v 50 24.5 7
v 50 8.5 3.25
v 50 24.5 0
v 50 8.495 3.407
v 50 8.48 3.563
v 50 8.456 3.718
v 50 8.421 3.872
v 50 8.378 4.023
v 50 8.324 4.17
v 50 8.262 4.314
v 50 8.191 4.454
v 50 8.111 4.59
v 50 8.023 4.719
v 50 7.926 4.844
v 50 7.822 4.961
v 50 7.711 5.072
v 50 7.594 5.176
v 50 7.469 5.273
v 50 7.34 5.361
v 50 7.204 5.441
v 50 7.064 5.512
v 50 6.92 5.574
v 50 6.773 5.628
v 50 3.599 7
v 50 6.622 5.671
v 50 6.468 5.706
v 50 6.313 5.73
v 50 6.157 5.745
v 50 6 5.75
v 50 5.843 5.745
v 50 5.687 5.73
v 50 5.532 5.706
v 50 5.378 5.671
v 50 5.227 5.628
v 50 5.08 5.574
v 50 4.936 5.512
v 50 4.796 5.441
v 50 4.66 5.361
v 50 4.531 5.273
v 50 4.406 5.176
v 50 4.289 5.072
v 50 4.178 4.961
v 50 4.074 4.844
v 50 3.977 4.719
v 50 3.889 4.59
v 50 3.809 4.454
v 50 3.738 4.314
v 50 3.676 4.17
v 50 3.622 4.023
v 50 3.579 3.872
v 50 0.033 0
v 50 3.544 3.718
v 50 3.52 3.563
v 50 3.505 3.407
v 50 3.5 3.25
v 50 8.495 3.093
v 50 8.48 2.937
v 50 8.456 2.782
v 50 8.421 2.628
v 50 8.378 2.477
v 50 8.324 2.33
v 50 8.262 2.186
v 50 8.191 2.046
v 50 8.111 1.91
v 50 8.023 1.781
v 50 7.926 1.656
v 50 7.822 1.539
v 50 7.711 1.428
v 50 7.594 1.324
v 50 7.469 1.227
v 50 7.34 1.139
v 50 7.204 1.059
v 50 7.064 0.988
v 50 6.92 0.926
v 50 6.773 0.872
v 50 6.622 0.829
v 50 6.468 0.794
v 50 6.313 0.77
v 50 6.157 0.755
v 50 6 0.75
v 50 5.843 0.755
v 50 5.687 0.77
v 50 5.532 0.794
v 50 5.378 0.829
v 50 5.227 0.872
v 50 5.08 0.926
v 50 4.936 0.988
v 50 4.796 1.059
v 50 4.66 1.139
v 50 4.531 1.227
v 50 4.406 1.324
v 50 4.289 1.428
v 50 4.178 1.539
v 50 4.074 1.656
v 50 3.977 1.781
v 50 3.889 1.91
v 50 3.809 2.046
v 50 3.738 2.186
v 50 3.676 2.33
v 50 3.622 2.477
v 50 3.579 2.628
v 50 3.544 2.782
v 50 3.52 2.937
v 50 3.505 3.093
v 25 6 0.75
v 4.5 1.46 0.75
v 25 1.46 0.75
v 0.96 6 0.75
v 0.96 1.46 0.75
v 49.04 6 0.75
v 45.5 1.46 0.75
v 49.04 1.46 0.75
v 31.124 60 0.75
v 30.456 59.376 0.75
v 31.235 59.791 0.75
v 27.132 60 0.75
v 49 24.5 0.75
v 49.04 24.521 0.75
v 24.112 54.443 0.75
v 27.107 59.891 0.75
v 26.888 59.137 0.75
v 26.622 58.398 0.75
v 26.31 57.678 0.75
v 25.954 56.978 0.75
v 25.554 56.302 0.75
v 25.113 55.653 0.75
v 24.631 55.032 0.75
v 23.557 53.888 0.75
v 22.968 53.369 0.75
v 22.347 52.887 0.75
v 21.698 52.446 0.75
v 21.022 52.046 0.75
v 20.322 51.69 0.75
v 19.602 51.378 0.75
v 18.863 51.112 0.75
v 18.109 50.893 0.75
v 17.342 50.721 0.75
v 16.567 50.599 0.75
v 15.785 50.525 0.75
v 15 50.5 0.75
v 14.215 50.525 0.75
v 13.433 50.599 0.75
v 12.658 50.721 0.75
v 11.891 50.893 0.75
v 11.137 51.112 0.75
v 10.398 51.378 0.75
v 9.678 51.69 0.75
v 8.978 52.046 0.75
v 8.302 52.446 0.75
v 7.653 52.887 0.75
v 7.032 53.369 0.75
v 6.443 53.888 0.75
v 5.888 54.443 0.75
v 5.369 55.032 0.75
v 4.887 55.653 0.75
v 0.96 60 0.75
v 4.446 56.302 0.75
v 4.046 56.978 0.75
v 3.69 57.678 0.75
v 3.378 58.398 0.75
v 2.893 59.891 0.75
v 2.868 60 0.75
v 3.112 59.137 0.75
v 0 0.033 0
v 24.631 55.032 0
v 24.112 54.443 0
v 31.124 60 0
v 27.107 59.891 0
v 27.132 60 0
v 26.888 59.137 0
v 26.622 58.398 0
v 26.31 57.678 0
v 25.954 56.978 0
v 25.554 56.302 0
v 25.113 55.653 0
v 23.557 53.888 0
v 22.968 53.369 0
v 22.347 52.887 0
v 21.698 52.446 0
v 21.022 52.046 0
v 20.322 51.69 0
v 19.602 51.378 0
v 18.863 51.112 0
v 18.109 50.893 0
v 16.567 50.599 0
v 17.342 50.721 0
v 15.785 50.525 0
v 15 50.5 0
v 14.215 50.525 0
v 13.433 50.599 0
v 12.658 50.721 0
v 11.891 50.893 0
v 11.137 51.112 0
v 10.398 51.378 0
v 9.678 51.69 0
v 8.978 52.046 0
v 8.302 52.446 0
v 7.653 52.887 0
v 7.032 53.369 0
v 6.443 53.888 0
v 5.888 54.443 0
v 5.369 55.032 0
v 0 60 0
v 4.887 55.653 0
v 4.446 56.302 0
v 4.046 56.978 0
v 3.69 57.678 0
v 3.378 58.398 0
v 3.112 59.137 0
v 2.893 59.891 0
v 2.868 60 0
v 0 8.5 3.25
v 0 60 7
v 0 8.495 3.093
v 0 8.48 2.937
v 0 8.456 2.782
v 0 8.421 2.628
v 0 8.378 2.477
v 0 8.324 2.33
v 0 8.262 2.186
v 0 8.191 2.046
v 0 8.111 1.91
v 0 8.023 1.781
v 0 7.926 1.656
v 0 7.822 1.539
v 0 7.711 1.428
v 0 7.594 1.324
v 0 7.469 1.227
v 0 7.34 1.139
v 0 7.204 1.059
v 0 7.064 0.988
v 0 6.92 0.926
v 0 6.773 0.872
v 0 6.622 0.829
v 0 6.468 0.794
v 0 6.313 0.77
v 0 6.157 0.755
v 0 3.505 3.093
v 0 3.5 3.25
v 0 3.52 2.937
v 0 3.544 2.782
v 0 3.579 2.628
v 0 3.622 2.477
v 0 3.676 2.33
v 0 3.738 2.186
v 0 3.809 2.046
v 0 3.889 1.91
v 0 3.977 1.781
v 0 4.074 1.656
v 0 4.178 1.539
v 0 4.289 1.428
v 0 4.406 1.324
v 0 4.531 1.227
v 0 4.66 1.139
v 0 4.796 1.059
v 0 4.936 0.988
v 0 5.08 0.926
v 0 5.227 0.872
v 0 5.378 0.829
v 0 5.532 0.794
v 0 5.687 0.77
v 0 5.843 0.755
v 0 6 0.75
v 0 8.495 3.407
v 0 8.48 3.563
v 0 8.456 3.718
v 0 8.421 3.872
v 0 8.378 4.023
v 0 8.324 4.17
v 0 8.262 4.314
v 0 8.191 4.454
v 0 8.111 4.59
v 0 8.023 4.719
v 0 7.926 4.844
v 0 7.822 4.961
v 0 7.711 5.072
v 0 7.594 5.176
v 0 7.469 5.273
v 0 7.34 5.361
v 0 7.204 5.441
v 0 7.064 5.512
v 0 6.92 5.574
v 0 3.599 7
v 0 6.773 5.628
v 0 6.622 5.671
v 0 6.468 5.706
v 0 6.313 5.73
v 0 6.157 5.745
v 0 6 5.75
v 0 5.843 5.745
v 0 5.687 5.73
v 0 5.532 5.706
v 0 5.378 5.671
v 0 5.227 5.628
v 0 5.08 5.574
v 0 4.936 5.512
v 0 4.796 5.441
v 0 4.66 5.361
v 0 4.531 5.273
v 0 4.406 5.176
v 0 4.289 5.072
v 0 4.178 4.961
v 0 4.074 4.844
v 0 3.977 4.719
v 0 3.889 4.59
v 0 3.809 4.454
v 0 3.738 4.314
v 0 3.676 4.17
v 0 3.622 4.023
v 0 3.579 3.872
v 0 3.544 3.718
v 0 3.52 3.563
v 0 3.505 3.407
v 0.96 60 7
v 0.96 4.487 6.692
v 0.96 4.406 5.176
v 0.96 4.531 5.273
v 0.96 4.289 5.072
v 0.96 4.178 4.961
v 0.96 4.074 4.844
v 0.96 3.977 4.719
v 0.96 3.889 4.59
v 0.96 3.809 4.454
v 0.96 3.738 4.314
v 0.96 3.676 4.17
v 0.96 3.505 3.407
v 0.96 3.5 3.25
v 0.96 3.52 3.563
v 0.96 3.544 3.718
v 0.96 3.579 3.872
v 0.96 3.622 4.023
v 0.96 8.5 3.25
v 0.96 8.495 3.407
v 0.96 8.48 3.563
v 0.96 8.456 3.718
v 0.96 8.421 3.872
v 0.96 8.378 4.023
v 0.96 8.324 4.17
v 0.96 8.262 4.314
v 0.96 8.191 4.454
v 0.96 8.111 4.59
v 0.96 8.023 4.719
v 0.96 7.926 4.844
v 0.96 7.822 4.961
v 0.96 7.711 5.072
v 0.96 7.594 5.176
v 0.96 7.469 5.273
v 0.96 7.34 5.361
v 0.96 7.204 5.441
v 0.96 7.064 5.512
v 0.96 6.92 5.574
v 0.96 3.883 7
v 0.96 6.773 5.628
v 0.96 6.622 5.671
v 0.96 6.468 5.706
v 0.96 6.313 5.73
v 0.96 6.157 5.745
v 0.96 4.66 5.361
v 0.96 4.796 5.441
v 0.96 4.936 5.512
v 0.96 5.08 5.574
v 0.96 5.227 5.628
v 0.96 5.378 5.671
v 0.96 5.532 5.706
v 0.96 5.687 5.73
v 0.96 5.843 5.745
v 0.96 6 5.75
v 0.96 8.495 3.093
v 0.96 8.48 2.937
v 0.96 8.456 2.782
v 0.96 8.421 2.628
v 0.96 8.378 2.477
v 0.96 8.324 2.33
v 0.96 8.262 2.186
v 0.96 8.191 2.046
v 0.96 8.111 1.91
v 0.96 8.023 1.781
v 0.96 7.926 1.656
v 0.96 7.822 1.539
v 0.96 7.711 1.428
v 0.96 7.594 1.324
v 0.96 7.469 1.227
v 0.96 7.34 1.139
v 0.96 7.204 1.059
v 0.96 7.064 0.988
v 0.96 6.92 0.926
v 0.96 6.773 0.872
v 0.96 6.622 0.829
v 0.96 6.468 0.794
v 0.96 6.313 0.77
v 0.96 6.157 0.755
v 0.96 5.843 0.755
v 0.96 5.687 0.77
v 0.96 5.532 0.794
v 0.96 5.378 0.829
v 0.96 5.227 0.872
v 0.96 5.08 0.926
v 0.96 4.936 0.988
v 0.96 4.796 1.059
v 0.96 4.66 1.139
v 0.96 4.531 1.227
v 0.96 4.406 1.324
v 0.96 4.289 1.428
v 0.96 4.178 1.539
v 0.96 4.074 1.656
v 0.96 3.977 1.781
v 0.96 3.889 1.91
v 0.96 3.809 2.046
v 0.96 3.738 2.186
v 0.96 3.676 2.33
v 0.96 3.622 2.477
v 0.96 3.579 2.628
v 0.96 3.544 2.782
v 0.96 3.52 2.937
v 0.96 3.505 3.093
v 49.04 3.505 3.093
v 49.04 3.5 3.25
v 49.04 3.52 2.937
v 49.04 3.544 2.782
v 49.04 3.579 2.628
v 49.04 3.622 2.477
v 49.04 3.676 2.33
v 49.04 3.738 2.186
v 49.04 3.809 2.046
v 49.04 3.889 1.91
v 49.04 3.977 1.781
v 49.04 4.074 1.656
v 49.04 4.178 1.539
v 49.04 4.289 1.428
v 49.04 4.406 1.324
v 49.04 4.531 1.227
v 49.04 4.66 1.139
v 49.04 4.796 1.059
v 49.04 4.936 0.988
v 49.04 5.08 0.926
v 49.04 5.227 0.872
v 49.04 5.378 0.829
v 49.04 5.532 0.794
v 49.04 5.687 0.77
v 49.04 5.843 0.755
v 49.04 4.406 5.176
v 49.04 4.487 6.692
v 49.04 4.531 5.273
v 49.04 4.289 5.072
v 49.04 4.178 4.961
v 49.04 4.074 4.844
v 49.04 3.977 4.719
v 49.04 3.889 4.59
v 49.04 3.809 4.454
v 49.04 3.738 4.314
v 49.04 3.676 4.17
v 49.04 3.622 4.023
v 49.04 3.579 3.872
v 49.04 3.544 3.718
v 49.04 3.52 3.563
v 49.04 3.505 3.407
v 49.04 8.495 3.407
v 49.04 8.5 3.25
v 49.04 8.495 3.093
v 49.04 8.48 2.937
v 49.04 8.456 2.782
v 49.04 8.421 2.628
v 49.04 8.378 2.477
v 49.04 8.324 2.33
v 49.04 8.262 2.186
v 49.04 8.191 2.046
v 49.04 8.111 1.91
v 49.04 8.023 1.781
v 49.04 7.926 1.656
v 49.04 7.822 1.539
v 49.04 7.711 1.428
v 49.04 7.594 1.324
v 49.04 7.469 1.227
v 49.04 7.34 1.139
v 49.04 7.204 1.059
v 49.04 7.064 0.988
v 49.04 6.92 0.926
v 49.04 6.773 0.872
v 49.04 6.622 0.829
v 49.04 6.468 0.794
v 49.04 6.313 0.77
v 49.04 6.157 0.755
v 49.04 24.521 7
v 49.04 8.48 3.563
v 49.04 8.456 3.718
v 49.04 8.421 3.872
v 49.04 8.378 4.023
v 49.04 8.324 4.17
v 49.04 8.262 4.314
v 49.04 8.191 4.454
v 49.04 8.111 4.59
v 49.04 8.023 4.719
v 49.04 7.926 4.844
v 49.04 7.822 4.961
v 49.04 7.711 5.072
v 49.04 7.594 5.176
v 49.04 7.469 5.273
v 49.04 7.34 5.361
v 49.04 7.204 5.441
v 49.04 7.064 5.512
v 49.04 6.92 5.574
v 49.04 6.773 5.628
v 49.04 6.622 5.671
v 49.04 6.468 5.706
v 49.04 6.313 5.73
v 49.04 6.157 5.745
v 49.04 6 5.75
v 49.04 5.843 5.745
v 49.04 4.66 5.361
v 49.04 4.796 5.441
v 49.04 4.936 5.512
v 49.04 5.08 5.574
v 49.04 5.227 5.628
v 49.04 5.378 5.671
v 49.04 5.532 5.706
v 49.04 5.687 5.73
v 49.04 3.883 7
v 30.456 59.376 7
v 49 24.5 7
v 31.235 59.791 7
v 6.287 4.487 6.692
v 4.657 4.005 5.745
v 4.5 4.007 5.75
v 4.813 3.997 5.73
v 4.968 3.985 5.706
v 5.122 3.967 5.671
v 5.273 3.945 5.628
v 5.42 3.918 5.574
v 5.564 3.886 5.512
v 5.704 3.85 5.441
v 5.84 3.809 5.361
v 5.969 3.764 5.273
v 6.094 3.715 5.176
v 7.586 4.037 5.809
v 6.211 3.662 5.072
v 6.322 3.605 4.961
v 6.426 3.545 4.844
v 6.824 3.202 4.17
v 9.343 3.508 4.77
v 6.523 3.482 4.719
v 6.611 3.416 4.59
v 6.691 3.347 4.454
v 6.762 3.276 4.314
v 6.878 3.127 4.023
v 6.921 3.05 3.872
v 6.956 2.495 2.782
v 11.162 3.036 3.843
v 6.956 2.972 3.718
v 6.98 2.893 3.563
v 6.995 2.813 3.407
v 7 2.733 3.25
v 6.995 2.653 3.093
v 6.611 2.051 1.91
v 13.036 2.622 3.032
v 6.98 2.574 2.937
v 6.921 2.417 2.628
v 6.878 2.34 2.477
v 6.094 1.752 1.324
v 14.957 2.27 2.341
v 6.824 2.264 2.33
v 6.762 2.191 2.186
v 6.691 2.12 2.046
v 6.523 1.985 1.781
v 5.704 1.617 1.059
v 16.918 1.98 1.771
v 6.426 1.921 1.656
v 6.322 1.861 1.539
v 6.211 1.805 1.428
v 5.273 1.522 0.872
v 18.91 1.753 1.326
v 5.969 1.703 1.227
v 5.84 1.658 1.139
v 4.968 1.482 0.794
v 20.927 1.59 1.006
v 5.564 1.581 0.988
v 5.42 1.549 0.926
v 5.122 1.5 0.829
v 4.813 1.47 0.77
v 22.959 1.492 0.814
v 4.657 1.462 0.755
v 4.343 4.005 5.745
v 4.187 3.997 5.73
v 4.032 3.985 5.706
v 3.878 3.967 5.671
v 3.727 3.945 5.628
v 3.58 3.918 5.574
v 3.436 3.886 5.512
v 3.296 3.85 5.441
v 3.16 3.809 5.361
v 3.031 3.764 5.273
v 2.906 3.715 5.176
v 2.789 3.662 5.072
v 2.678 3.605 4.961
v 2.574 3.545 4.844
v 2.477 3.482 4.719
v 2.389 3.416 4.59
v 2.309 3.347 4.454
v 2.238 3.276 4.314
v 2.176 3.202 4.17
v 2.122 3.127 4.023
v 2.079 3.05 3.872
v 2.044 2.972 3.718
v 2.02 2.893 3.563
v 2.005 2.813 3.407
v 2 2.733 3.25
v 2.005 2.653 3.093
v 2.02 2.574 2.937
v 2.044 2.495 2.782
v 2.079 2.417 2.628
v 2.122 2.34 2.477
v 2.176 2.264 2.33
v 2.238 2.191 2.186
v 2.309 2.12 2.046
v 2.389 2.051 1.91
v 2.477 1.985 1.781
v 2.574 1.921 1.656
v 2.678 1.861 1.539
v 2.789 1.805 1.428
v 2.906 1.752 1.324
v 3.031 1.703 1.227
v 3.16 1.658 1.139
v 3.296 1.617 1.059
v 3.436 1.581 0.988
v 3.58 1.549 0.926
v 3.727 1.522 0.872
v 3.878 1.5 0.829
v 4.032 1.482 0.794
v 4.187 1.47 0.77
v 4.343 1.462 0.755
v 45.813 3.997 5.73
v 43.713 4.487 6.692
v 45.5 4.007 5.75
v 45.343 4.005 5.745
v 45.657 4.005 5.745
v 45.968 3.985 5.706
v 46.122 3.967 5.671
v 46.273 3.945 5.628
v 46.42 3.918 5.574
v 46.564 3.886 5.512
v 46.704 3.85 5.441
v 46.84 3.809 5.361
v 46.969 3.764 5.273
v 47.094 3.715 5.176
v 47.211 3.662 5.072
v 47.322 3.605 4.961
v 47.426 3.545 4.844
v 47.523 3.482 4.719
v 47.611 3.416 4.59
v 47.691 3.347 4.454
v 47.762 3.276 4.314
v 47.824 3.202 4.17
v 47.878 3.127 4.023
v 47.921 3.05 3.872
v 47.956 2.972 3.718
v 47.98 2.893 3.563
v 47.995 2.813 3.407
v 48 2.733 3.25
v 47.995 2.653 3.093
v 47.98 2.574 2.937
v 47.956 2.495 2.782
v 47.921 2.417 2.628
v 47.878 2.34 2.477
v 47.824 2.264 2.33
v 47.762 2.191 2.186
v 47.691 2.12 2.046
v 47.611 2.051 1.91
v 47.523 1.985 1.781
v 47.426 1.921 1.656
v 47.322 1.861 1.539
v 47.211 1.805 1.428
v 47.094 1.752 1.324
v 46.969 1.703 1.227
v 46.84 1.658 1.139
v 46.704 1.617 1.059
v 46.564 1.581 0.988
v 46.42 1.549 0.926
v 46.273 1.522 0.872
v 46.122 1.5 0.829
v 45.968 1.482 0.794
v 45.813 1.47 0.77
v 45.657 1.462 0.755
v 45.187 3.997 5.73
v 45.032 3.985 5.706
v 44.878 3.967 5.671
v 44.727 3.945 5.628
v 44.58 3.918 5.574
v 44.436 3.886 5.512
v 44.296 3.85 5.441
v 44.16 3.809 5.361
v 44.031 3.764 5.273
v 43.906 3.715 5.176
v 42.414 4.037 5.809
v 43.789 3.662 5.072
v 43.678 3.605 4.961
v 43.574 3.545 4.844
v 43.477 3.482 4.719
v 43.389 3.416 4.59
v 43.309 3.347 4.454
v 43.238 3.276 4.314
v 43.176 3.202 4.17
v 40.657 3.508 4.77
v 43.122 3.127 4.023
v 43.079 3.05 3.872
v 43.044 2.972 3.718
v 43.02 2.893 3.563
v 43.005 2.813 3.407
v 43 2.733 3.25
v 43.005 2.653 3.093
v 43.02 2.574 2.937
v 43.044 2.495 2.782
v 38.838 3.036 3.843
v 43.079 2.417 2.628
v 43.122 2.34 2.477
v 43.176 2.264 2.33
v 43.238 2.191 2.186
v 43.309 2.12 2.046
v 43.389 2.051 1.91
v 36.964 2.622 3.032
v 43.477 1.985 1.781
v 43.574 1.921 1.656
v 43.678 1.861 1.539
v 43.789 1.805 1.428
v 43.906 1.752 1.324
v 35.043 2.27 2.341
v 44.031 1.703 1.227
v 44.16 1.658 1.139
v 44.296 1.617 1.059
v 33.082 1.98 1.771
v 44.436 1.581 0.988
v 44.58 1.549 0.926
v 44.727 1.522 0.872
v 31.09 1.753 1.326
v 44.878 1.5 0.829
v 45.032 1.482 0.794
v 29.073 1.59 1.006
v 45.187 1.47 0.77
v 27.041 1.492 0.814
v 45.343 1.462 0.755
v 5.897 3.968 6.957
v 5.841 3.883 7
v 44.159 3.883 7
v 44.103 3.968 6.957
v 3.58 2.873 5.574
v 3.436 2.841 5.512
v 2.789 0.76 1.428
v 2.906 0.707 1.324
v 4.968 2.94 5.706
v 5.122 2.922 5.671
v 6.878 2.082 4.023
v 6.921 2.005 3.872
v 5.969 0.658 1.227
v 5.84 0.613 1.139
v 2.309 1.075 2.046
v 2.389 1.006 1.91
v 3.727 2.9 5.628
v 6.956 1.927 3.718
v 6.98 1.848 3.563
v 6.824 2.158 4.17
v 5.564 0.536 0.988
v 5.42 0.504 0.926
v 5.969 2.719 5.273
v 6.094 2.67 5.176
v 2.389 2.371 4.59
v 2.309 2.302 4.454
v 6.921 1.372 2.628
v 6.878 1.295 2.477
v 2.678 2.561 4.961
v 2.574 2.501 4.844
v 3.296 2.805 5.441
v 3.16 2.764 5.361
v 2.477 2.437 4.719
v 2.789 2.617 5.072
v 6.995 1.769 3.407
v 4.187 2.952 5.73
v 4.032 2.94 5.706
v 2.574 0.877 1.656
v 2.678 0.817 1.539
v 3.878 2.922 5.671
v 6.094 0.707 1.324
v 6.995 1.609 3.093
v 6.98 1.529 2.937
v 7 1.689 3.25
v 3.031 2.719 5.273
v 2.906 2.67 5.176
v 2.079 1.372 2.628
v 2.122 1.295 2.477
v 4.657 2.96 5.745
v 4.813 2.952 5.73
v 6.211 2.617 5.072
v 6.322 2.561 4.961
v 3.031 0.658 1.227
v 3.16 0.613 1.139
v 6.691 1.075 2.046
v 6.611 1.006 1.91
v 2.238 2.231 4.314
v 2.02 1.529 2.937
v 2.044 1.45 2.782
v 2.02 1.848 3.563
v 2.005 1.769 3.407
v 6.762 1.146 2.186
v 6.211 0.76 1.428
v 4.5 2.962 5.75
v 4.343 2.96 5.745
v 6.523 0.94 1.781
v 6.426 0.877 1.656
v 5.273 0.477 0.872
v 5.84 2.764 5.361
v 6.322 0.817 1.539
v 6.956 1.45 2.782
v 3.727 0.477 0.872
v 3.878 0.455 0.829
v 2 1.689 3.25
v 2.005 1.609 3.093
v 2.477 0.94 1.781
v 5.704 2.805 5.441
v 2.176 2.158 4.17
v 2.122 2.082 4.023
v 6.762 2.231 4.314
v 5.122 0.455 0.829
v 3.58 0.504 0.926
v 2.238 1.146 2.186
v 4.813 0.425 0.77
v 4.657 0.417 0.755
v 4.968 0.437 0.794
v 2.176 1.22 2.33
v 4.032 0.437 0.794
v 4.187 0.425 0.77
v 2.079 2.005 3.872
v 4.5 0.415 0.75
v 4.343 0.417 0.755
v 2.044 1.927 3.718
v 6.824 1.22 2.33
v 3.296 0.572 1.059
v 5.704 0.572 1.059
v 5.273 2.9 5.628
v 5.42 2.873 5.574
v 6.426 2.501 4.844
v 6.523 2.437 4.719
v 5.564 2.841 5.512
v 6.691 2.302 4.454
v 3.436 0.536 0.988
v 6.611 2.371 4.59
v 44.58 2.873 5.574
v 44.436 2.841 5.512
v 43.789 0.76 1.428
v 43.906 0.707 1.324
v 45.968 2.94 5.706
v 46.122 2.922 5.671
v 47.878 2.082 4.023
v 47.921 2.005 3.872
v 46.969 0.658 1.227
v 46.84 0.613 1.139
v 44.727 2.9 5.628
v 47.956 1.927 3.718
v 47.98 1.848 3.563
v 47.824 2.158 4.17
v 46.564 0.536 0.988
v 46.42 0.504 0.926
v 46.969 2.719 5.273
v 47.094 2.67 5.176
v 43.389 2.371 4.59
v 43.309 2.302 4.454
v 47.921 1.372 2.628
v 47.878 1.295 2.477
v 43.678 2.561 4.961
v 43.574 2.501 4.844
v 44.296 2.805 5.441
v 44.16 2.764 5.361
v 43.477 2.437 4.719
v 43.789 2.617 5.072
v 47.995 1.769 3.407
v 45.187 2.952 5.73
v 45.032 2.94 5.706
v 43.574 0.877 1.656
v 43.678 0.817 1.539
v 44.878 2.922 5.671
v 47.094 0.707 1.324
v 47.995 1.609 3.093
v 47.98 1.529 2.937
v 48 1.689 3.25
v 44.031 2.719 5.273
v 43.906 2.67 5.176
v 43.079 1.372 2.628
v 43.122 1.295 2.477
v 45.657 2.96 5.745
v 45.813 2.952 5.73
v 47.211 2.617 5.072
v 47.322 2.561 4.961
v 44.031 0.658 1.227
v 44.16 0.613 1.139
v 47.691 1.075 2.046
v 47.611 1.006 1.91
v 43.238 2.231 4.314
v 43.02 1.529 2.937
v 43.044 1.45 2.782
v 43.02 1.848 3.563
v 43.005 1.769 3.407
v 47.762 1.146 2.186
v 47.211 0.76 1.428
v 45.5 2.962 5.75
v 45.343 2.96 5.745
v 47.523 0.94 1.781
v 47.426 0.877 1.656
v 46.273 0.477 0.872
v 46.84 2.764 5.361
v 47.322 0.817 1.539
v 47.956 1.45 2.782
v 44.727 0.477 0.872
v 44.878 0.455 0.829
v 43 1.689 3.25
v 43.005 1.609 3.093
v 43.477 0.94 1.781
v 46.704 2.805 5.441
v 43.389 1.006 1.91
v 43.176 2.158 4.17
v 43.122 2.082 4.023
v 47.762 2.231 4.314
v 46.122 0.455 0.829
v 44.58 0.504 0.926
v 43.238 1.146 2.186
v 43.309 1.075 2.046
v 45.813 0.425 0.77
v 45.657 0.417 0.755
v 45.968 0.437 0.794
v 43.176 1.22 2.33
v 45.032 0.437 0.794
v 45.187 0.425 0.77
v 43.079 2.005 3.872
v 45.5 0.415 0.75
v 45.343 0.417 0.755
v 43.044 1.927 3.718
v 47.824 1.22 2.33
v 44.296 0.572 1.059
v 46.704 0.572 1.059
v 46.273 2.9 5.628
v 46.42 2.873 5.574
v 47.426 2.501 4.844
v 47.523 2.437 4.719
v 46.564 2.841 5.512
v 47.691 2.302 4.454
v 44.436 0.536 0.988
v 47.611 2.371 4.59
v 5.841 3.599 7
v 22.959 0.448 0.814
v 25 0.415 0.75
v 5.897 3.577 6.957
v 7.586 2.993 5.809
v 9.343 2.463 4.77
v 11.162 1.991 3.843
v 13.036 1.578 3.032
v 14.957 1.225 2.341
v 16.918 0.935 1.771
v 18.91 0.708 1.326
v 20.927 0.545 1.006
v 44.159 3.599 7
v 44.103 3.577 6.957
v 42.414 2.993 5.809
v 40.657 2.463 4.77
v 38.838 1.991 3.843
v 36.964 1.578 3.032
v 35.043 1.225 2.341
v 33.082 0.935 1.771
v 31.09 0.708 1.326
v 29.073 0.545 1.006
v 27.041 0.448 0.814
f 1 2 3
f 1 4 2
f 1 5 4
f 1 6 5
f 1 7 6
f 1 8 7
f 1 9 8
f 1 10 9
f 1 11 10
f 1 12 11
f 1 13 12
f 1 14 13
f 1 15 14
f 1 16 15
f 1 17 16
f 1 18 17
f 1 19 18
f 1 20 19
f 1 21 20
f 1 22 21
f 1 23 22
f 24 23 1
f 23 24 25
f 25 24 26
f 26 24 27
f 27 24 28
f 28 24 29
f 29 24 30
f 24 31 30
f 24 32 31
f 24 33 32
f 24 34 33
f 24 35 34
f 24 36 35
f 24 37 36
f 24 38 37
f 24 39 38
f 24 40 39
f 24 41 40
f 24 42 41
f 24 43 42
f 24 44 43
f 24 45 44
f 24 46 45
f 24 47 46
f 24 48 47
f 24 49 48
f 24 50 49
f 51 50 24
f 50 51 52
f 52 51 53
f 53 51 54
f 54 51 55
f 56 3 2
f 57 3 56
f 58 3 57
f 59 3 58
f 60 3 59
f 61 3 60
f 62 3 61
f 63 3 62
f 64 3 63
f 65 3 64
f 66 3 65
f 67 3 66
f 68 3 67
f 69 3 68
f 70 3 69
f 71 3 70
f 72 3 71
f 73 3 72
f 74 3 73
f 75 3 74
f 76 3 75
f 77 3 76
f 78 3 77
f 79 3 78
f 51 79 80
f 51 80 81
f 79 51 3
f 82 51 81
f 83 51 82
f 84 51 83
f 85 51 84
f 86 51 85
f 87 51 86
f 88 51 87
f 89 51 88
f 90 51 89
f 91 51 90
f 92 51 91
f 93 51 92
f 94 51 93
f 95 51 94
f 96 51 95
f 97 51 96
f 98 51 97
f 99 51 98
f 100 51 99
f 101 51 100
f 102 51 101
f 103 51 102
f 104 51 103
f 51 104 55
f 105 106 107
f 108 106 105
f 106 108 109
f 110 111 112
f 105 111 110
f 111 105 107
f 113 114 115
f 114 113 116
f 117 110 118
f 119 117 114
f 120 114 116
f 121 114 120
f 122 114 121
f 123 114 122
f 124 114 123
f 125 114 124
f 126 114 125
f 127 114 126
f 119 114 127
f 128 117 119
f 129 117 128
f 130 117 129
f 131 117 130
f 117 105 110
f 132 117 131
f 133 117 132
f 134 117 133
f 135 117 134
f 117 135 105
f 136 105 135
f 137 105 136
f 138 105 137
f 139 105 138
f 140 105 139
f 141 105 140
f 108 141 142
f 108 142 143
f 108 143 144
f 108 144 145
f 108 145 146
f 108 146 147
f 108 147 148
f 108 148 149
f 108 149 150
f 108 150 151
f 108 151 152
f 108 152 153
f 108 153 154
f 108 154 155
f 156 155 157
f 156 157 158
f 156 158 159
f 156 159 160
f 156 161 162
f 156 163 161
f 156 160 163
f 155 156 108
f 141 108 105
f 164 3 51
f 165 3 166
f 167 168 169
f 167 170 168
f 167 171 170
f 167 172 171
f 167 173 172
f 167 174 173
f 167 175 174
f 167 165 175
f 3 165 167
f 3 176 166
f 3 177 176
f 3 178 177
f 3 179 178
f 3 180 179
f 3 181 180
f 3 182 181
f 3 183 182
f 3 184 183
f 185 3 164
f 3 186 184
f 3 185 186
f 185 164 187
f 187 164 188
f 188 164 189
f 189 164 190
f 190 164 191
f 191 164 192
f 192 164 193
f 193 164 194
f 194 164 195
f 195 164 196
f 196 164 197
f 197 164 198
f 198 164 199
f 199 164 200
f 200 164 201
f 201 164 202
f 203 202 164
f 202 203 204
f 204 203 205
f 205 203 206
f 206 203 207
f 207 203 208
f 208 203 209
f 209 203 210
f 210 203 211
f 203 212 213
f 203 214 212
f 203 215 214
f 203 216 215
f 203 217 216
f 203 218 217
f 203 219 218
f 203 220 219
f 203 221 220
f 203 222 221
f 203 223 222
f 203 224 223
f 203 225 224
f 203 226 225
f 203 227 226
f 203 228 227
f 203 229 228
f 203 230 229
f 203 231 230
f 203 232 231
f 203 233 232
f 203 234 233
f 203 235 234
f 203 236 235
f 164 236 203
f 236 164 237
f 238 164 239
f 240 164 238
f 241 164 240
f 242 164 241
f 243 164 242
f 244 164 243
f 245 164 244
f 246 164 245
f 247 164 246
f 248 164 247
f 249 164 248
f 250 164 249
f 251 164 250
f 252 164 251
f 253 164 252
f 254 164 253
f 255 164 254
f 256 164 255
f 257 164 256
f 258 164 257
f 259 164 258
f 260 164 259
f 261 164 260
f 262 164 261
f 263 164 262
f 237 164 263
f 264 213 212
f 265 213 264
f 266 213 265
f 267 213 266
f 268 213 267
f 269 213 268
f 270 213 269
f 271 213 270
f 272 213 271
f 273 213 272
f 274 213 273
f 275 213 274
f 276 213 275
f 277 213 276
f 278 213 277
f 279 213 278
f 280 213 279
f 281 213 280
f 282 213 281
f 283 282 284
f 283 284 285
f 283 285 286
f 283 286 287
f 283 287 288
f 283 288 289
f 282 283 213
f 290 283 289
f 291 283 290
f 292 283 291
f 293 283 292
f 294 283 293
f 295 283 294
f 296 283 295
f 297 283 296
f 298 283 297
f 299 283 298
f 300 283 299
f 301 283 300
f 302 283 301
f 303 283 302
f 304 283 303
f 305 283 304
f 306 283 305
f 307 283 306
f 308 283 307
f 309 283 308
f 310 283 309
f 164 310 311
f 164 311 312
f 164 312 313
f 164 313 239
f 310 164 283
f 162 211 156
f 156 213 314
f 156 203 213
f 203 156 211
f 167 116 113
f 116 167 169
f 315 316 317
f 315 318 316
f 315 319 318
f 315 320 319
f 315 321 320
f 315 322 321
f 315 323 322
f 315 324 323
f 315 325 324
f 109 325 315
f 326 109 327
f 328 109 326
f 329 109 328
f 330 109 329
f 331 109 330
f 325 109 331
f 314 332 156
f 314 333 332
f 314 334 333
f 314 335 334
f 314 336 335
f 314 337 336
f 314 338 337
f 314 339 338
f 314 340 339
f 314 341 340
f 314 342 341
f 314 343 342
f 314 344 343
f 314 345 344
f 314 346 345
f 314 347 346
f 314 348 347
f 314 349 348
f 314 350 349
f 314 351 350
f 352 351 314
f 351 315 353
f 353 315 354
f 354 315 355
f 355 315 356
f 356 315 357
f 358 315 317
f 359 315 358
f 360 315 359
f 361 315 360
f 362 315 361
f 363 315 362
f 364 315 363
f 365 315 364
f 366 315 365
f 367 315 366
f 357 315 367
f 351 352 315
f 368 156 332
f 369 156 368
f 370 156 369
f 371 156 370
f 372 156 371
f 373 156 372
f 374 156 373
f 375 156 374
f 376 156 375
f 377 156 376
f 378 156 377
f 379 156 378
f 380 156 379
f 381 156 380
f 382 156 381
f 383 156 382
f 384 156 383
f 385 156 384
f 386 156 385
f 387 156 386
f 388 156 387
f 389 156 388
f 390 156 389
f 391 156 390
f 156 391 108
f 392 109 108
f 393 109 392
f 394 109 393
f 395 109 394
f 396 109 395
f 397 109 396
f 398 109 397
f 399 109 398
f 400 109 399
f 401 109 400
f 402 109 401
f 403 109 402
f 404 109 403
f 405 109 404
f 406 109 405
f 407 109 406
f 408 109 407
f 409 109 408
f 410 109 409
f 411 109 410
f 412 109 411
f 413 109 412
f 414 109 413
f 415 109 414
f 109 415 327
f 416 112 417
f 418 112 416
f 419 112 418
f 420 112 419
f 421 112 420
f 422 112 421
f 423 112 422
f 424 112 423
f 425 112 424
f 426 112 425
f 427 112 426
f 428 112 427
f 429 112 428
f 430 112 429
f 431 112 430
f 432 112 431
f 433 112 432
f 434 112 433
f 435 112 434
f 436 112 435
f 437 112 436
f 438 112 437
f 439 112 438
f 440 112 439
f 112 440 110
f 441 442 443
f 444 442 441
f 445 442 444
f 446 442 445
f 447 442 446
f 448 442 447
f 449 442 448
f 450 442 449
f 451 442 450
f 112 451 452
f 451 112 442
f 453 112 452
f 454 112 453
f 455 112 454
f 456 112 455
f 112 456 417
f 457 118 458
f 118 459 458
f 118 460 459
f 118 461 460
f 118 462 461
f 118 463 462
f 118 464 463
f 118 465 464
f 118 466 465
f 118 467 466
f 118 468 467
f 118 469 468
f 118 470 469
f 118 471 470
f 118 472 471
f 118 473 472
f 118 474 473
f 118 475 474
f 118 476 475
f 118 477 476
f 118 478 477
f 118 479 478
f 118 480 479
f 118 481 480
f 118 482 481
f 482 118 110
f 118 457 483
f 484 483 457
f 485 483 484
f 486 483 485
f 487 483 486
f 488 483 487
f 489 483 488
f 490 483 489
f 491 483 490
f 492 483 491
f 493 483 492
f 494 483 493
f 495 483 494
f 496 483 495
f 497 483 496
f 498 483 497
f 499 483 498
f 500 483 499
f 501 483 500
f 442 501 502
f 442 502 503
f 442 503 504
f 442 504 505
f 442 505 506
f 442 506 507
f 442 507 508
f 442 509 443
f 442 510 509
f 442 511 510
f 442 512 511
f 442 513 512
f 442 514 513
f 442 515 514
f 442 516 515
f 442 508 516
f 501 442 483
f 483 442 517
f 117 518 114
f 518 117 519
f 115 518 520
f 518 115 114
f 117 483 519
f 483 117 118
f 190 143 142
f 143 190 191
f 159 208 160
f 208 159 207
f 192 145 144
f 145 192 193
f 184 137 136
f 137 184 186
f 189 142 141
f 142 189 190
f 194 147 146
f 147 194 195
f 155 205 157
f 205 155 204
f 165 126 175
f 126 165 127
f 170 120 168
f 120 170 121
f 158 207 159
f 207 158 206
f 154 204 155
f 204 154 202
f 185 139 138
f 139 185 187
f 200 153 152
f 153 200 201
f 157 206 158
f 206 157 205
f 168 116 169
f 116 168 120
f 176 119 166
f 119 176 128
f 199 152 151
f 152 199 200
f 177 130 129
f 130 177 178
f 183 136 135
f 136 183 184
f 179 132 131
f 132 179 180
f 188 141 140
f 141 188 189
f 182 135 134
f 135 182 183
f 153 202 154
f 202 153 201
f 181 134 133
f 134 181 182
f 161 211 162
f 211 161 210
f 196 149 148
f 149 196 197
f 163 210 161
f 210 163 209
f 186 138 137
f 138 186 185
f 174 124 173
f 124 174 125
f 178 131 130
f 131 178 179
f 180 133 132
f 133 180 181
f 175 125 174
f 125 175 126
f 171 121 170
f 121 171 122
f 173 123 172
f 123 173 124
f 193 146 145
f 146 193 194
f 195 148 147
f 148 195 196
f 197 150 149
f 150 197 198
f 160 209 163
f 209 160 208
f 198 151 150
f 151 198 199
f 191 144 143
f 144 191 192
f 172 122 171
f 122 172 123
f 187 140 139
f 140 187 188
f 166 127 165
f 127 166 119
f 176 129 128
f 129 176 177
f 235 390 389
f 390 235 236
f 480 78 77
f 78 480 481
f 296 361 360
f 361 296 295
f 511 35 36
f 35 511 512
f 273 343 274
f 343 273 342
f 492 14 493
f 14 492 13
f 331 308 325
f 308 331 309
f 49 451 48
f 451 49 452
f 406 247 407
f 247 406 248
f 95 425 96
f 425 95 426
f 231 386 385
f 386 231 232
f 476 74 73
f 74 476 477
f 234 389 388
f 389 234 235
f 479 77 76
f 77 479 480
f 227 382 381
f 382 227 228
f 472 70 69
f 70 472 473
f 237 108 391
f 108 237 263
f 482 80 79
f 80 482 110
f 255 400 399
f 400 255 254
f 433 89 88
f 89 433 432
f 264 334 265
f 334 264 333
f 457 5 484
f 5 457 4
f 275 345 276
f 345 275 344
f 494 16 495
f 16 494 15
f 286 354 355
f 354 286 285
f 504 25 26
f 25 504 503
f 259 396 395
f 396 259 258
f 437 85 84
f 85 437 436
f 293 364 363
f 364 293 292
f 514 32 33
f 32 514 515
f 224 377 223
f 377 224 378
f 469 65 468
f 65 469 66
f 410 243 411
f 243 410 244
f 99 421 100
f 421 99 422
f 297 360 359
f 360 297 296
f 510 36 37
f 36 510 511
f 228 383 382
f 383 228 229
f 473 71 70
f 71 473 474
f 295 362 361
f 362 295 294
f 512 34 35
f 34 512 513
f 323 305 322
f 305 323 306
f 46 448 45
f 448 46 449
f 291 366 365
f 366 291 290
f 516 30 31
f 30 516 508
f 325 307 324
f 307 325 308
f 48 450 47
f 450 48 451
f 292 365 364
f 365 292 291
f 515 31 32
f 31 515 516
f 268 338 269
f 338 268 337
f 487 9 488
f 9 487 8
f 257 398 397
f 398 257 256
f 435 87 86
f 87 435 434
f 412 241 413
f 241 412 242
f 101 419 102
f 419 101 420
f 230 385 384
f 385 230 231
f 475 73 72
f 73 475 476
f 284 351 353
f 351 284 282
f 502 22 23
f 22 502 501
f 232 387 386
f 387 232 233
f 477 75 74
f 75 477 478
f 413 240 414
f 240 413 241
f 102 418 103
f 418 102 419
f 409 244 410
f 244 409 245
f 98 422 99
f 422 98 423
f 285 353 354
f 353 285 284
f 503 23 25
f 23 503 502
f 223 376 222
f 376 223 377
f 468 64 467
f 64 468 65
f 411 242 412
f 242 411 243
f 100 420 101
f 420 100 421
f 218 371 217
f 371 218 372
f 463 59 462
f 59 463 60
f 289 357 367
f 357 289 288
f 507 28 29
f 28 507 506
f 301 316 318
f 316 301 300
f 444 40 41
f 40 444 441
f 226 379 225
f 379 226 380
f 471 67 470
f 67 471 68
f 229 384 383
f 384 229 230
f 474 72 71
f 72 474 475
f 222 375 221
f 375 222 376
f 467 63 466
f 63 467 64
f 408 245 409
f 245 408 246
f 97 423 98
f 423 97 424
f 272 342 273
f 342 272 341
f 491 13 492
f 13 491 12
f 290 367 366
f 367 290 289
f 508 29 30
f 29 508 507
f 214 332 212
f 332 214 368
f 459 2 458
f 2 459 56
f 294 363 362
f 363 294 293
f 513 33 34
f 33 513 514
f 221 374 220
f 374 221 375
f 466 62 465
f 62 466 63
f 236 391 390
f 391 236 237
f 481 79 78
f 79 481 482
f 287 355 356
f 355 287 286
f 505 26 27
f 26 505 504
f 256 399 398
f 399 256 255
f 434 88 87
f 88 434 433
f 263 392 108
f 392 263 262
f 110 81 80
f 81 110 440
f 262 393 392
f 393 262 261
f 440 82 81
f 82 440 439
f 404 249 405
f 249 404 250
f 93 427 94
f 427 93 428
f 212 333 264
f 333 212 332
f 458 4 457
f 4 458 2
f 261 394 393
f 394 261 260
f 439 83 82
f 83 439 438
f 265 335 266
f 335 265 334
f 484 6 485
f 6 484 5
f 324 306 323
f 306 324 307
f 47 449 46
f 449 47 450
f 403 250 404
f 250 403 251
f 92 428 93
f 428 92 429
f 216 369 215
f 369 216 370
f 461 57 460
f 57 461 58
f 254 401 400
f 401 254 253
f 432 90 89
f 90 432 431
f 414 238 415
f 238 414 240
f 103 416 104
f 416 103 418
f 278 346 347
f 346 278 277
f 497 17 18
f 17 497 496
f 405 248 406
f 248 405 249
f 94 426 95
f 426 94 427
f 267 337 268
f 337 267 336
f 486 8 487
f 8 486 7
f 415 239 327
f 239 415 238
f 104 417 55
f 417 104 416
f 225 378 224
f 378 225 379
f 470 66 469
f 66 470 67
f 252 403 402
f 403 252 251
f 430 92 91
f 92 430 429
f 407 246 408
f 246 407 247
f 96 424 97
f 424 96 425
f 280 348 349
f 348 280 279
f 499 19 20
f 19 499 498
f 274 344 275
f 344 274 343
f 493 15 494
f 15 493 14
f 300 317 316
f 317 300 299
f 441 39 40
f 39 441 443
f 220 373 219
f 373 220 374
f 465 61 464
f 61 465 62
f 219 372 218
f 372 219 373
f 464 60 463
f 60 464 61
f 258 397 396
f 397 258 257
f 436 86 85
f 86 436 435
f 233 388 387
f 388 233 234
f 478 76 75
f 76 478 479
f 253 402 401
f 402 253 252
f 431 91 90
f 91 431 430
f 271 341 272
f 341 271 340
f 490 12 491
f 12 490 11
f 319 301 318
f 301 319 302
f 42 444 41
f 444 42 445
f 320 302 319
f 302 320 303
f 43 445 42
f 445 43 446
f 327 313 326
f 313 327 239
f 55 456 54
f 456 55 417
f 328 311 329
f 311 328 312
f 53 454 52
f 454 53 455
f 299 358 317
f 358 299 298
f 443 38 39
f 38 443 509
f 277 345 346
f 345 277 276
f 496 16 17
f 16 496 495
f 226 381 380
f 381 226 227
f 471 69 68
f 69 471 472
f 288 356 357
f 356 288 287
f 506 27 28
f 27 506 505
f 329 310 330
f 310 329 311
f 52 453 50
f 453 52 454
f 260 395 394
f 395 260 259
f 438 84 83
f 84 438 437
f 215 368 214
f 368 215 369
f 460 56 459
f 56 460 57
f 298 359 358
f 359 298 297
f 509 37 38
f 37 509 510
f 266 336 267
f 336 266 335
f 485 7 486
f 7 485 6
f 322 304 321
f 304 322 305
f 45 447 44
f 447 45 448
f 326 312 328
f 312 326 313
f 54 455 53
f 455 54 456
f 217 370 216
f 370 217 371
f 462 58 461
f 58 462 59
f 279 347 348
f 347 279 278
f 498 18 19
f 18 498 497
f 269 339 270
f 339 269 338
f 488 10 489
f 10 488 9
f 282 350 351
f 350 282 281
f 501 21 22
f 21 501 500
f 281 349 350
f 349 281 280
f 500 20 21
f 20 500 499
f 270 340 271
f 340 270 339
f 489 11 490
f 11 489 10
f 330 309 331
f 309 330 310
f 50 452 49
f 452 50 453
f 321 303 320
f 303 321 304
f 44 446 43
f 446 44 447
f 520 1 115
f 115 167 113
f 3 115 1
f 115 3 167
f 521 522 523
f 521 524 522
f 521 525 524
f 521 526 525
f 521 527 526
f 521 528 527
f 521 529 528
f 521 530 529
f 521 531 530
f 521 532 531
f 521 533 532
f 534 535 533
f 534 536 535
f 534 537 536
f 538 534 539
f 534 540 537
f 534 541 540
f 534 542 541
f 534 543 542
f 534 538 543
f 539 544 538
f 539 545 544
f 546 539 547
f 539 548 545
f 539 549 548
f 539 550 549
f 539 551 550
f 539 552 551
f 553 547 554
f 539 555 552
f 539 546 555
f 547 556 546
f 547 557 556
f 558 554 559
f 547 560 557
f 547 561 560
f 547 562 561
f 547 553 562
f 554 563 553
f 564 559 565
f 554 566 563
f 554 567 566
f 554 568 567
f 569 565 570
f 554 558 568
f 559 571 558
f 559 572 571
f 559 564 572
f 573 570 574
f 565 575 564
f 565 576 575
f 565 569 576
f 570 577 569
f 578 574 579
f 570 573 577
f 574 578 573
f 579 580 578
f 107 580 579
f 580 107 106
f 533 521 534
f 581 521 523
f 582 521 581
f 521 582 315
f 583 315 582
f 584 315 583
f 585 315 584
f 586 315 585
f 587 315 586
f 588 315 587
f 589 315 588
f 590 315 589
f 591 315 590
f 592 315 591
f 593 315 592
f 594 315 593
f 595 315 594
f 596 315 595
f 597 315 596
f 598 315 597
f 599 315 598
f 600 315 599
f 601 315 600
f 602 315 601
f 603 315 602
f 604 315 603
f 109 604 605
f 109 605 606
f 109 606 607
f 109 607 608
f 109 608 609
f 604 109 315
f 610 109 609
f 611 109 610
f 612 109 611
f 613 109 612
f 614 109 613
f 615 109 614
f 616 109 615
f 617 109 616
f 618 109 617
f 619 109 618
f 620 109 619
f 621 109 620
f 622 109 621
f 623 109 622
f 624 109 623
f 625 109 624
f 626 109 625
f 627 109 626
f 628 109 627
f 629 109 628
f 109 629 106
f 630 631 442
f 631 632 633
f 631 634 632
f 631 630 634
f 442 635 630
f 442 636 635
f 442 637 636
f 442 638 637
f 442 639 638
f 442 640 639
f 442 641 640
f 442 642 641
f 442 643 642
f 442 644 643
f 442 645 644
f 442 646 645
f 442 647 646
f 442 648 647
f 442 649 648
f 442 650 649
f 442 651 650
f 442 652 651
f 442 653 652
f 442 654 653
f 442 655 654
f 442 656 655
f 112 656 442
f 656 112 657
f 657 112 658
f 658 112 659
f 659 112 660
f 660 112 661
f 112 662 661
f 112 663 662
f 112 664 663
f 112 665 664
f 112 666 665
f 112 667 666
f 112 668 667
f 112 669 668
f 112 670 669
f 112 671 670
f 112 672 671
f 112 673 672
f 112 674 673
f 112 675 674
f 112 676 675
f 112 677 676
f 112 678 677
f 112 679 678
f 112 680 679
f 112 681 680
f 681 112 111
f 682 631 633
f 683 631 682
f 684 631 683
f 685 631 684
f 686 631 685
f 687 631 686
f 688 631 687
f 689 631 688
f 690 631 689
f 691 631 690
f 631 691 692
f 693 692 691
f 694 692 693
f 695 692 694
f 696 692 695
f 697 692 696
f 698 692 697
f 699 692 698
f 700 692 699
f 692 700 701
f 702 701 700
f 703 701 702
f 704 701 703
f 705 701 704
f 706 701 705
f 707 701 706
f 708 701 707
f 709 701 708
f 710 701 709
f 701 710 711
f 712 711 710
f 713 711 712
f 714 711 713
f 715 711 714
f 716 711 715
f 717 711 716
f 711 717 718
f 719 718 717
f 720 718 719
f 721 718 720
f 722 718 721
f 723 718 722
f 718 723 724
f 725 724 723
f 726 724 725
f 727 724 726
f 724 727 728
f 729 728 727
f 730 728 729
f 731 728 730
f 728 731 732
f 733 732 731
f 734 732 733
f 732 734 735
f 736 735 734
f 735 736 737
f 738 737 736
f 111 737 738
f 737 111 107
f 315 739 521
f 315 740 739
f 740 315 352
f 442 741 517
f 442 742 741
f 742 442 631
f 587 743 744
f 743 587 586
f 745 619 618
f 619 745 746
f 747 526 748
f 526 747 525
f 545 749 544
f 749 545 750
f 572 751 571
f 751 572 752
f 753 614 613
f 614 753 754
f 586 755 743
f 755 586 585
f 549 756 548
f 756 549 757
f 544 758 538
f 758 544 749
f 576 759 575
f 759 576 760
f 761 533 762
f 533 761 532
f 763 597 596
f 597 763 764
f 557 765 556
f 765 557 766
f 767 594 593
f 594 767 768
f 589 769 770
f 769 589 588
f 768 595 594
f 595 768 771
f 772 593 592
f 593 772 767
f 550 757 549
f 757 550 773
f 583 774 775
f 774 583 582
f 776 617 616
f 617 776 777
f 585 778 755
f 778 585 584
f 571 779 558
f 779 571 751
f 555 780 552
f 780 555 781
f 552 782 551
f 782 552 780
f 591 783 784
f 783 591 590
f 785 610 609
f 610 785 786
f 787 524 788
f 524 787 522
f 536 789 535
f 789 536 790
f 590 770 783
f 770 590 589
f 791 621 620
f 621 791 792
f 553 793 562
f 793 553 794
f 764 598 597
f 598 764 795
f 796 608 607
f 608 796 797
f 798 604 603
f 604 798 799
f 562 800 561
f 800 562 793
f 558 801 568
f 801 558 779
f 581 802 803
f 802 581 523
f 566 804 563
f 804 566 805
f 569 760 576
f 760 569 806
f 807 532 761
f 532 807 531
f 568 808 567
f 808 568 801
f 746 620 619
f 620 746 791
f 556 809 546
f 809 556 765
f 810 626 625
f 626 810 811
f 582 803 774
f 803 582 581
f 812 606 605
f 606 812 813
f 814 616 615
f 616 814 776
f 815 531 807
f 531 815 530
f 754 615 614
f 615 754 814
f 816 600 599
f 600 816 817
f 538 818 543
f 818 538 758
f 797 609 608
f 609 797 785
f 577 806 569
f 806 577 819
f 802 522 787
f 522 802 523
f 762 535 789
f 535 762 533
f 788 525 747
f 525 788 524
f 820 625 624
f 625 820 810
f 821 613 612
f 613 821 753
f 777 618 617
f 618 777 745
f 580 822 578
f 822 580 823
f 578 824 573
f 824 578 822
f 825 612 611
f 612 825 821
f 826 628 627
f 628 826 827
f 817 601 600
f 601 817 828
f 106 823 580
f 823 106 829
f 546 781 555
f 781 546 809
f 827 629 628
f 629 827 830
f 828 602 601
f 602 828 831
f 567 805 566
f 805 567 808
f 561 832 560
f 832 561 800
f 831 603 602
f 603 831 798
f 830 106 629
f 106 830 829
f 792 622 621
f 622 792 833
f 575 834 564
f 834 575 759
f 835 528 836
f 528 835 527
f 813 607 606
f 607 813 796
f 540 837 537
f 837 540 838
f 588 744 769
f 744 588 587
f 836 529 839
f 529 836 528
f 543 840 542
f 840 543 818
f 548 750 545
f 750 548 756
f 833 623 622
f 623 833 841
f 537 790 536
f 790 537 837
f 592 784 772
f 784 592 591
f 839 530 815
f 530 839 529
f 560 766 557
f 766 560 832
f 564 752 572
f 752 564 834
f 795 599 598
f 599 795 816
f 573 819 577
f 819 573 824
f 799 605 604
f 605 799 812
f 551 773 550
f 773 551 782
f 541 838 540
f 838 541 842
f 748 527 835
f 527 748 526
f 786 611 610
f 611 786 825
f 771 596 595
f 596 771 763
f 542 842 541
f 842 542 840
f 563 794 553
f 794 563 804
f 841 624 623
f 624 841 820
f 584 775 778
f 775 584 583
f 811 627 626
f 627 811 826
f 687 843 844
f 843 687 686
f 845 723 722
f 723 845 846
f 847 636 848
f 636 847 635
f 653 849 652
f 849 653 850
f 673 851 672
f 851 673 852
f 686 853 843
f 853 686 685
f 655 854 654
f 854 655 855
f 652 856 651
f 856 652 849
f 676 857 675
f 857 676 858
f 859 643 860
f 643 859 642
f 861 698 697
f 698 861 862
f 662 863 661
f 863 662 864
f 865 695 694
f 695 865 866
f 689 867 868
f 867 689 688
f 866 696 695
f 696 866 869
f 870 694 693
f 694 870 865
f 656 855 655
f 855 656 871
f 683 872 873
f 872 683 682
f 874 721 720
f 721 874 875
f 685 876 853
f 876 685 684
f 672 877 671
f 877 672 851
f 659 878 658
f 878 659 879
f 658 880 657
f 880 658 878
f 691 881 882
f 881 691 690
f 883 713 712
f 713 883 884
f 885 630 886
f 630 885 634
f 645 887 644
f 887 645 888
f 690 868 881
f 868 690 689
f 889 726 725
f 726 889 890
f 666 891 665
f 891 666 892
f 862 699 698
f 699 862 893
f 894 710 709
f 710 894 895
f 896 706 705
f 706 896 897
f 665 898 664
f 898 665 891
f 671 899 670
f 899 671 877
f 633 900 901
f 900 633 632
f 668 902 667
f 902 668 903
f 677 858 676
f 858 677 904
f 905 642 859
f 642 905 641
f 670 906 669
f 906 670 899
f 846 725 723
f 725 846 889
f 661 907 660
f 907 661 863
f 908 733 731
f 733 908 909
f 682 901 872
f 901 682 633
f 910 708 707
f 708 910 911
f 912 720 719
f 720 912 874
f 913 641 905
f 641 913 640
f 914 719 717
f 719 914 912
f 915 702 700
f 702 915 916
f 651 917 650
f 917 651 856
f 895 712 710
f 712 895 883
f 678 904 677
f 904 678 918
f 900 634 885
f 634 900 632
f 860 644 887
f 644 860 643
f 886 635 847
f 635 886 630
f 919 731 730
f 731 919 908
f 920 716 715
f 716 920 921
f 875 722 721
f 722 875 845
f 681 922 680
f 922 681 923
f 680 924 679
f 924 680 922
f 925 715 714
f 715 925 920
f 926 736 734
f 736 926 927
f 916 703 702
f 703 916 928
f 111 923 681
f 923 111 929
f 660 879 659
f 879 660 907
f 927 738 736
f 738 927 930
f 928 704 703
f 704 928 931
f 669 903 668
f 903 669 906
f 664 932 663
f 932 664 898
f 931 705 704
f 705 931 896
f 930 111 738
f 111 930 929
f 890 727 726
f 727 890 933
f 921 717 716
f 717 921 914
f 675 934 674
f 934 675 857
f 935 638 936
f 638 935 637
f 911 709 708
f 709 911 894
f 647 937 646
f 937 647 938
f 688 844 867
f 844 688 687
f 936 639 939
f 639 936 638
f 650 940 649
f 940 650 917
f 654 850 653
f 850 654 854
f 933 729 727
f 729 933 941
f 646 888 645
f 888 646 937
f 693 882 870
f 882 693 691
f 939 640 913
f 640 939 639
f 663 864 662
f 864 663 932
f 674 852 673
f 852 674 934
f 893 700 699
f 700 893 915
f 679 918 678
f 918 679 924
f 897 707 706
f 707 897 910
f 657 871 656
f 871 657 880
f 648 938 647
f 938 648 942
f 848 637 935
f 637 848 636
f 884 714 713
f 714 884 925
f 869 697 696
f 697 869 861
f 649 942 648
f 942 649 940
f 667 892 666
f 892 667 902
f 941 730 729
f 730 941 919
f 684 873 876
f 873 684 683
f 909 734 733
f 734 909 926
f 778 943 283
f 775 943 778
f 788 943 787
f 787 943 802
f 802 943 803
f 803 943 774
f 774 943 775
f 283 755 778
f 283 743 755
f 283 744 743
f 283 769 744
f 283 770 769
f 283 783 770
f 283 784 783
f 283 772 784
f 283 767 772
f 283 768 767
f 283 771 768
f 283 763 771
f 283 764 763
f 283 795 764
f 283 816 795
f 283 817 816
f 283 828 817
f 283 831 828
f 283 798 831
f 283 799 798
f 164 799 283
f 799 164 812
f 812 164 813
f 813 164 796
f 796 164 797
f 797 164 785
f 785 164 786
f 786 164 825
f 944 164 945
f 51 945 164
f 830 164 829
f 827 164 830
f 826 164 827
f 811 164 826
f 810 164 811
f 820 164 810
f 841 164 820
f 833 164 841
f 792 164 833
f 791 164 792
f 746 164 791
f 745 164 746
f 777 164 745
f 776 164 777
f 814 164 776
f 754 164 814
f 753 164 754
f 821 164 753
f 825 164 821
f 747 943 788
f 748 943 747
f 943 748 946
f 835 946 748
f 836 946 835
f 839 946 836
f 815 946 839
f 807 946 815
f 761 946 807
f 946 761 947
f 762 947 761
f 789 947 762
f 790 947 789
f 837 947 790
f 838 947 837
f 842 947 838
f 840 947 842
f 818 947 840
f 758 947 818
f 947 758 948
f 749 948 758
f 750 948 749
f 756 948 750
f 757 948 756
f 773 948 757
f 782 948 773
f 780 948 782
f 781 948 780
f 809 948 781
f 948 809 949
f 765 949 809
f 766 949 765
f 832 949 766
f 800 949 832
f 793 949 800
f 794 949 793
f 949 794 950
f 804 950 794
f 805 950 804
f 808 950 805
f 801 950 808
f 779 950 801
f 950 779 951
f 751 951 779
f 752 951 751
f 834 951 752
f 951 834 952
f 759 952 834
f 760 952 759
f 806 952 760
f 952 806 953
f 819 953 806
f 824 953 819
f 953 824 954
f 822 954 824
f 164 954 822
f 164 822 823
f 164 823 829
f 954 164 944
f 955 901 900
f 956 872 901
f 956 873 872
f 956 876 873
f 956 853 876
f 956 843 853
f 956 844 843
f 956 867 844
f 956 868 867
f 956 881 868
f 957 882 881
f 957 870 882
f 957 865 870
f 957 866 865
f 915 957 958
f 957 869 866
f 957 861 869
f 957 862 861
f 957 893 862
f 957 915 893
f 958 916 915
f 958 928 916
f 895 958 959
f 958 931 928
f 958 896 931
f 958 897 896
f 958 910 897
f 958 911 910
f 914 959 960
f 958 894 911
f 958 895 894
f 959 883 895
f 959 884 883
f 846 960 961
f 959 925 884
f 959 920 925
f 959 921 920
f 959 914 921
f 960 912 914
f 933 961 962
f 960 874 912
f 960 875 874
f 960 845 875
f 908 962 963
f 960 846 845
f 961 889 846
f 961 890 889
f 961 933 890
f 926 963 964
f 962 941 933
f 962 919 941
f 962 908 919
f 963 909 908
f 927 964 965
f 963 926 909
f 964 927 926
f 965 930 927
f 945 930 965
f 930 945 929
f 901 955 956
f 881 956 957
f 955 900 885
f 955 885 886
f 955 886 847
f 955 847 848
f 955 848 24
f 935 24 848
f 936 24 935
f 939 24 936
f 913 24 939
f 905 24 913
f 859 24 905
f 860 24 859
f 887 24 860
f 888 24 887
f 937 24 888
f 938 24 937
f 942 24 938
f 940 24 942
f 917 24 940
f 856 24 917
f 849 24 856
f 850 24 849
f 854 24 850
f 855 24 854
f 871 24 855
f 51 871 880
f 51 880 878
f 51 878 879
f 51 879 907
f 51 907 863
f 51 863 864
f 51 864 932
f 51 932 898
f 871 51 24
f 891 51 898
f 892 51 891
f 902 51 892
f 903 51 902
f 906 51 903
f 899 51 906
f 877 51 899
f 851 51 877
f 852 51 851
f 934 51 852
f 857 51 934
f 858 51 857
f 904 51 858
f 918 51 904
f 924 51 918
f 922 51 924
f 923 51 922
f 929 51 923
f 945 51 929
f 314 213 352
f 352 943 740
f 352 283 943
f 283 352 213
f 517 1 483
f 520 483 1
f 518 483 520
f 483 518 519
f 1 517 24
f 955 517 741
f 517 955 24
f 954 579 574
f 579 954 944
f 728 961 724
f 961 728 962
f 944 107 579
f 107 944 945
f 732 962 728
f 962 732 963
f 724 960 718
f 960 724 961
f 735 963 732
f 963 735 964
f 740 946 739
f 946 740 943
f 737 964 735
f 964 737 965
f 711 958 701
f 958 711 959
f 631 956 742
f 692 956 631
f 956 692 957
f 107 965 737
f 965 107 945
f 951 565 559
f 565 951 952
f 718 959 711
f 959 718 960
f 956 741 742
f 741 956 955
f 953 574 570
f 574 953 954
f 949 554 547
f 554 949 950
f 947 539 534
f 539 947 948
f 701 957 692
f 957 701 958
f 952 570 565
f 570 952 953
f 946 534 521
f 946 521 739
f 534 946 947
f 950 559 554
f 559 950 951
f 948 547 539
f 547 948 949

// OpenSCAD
$fn=100;

// TODO
// * make sides higher to adjust the airflow in the right direction
// * minor angle changes, increase it?

angle=27;
mount_hole_diameter=0;
shell_thickness=2*0.48;
bottom_thickness=0.75;

base_x = 50;
base_y = 60;

side_height = 8;

hole_d = 5;
fan_hole_d = 65;

difference() {
    union() {
        difference() {
            union() {
                // base
                cube([base_x,base_y,bottom_thickness]);
                
                // left side
                cube([shell_thickness,base_y,side_height]);
                
                // right side
                translate([base_x-shell_thickness,0,0])
                    cube([shell_thickness,base_y,side_height]);
                
                // right skew (completely custom)
                translate([49,24.5,0])
                    rotate([0,0,28])
                        cube([1,39.5,8]);
            };
            // HotEnd cylinder
            translate([15,63,-5])
                cylinder(d=25, h=20);
            
            // holes on sides
            translate([-20,6,(hole_d/2)+bottom_thickness])
                rotate([0,90,0])
                    cylinder(d=hole_d,h=80);
            
            // skew the right edge
            translate([49+1,24.5,-2])
                    rotate([0,0,28])
                        cube([20,39.5+5,8+2]);
        };

        difference() {
            // fan mount
            translate([0,0,0])
                rotate([-angle,0,0])
                    cube([base_x, shell_thickness, side_height]);
            
            // left hole
            translate([0,0,-0.25])
                //rotate([-angle,0,0])
                    translate([2+2.5,10,1+2.5])
                        mirror([0,90,90])
                            cylinder(d=hole_d,h=20);
            // right hole
            translate([0,0,-0.25])
                //rotate([-angle,0,0])
                    translate([41,0,0])
                        translate([2+2.5,10,1+2.5])
                            mirror([0,90,90])
                                cylinder(d=hole_d,h=20);
            
            // cut under to clean it
            translate([-base_x,-base_y,-1])
                cube([3*base_x,3*base_y,1]);
        }
    }
    
    // cut the angle to perfect it
    translate([-5,-19,6.7])
        rotate([-angle,0,0])
            cube([50+10,20,20]);
    
    // cut the top to perfect it
    translate([-10,-10,7])
        cube([100,100,20]);
    
    // cut the mount to perfect it
    translate([base_x/2,0,bottom_thickness + fan_hole_d/2])
        rotate([90,0,0])
            cylinder(d=fan_hole_d, h=20, center=true);
}
